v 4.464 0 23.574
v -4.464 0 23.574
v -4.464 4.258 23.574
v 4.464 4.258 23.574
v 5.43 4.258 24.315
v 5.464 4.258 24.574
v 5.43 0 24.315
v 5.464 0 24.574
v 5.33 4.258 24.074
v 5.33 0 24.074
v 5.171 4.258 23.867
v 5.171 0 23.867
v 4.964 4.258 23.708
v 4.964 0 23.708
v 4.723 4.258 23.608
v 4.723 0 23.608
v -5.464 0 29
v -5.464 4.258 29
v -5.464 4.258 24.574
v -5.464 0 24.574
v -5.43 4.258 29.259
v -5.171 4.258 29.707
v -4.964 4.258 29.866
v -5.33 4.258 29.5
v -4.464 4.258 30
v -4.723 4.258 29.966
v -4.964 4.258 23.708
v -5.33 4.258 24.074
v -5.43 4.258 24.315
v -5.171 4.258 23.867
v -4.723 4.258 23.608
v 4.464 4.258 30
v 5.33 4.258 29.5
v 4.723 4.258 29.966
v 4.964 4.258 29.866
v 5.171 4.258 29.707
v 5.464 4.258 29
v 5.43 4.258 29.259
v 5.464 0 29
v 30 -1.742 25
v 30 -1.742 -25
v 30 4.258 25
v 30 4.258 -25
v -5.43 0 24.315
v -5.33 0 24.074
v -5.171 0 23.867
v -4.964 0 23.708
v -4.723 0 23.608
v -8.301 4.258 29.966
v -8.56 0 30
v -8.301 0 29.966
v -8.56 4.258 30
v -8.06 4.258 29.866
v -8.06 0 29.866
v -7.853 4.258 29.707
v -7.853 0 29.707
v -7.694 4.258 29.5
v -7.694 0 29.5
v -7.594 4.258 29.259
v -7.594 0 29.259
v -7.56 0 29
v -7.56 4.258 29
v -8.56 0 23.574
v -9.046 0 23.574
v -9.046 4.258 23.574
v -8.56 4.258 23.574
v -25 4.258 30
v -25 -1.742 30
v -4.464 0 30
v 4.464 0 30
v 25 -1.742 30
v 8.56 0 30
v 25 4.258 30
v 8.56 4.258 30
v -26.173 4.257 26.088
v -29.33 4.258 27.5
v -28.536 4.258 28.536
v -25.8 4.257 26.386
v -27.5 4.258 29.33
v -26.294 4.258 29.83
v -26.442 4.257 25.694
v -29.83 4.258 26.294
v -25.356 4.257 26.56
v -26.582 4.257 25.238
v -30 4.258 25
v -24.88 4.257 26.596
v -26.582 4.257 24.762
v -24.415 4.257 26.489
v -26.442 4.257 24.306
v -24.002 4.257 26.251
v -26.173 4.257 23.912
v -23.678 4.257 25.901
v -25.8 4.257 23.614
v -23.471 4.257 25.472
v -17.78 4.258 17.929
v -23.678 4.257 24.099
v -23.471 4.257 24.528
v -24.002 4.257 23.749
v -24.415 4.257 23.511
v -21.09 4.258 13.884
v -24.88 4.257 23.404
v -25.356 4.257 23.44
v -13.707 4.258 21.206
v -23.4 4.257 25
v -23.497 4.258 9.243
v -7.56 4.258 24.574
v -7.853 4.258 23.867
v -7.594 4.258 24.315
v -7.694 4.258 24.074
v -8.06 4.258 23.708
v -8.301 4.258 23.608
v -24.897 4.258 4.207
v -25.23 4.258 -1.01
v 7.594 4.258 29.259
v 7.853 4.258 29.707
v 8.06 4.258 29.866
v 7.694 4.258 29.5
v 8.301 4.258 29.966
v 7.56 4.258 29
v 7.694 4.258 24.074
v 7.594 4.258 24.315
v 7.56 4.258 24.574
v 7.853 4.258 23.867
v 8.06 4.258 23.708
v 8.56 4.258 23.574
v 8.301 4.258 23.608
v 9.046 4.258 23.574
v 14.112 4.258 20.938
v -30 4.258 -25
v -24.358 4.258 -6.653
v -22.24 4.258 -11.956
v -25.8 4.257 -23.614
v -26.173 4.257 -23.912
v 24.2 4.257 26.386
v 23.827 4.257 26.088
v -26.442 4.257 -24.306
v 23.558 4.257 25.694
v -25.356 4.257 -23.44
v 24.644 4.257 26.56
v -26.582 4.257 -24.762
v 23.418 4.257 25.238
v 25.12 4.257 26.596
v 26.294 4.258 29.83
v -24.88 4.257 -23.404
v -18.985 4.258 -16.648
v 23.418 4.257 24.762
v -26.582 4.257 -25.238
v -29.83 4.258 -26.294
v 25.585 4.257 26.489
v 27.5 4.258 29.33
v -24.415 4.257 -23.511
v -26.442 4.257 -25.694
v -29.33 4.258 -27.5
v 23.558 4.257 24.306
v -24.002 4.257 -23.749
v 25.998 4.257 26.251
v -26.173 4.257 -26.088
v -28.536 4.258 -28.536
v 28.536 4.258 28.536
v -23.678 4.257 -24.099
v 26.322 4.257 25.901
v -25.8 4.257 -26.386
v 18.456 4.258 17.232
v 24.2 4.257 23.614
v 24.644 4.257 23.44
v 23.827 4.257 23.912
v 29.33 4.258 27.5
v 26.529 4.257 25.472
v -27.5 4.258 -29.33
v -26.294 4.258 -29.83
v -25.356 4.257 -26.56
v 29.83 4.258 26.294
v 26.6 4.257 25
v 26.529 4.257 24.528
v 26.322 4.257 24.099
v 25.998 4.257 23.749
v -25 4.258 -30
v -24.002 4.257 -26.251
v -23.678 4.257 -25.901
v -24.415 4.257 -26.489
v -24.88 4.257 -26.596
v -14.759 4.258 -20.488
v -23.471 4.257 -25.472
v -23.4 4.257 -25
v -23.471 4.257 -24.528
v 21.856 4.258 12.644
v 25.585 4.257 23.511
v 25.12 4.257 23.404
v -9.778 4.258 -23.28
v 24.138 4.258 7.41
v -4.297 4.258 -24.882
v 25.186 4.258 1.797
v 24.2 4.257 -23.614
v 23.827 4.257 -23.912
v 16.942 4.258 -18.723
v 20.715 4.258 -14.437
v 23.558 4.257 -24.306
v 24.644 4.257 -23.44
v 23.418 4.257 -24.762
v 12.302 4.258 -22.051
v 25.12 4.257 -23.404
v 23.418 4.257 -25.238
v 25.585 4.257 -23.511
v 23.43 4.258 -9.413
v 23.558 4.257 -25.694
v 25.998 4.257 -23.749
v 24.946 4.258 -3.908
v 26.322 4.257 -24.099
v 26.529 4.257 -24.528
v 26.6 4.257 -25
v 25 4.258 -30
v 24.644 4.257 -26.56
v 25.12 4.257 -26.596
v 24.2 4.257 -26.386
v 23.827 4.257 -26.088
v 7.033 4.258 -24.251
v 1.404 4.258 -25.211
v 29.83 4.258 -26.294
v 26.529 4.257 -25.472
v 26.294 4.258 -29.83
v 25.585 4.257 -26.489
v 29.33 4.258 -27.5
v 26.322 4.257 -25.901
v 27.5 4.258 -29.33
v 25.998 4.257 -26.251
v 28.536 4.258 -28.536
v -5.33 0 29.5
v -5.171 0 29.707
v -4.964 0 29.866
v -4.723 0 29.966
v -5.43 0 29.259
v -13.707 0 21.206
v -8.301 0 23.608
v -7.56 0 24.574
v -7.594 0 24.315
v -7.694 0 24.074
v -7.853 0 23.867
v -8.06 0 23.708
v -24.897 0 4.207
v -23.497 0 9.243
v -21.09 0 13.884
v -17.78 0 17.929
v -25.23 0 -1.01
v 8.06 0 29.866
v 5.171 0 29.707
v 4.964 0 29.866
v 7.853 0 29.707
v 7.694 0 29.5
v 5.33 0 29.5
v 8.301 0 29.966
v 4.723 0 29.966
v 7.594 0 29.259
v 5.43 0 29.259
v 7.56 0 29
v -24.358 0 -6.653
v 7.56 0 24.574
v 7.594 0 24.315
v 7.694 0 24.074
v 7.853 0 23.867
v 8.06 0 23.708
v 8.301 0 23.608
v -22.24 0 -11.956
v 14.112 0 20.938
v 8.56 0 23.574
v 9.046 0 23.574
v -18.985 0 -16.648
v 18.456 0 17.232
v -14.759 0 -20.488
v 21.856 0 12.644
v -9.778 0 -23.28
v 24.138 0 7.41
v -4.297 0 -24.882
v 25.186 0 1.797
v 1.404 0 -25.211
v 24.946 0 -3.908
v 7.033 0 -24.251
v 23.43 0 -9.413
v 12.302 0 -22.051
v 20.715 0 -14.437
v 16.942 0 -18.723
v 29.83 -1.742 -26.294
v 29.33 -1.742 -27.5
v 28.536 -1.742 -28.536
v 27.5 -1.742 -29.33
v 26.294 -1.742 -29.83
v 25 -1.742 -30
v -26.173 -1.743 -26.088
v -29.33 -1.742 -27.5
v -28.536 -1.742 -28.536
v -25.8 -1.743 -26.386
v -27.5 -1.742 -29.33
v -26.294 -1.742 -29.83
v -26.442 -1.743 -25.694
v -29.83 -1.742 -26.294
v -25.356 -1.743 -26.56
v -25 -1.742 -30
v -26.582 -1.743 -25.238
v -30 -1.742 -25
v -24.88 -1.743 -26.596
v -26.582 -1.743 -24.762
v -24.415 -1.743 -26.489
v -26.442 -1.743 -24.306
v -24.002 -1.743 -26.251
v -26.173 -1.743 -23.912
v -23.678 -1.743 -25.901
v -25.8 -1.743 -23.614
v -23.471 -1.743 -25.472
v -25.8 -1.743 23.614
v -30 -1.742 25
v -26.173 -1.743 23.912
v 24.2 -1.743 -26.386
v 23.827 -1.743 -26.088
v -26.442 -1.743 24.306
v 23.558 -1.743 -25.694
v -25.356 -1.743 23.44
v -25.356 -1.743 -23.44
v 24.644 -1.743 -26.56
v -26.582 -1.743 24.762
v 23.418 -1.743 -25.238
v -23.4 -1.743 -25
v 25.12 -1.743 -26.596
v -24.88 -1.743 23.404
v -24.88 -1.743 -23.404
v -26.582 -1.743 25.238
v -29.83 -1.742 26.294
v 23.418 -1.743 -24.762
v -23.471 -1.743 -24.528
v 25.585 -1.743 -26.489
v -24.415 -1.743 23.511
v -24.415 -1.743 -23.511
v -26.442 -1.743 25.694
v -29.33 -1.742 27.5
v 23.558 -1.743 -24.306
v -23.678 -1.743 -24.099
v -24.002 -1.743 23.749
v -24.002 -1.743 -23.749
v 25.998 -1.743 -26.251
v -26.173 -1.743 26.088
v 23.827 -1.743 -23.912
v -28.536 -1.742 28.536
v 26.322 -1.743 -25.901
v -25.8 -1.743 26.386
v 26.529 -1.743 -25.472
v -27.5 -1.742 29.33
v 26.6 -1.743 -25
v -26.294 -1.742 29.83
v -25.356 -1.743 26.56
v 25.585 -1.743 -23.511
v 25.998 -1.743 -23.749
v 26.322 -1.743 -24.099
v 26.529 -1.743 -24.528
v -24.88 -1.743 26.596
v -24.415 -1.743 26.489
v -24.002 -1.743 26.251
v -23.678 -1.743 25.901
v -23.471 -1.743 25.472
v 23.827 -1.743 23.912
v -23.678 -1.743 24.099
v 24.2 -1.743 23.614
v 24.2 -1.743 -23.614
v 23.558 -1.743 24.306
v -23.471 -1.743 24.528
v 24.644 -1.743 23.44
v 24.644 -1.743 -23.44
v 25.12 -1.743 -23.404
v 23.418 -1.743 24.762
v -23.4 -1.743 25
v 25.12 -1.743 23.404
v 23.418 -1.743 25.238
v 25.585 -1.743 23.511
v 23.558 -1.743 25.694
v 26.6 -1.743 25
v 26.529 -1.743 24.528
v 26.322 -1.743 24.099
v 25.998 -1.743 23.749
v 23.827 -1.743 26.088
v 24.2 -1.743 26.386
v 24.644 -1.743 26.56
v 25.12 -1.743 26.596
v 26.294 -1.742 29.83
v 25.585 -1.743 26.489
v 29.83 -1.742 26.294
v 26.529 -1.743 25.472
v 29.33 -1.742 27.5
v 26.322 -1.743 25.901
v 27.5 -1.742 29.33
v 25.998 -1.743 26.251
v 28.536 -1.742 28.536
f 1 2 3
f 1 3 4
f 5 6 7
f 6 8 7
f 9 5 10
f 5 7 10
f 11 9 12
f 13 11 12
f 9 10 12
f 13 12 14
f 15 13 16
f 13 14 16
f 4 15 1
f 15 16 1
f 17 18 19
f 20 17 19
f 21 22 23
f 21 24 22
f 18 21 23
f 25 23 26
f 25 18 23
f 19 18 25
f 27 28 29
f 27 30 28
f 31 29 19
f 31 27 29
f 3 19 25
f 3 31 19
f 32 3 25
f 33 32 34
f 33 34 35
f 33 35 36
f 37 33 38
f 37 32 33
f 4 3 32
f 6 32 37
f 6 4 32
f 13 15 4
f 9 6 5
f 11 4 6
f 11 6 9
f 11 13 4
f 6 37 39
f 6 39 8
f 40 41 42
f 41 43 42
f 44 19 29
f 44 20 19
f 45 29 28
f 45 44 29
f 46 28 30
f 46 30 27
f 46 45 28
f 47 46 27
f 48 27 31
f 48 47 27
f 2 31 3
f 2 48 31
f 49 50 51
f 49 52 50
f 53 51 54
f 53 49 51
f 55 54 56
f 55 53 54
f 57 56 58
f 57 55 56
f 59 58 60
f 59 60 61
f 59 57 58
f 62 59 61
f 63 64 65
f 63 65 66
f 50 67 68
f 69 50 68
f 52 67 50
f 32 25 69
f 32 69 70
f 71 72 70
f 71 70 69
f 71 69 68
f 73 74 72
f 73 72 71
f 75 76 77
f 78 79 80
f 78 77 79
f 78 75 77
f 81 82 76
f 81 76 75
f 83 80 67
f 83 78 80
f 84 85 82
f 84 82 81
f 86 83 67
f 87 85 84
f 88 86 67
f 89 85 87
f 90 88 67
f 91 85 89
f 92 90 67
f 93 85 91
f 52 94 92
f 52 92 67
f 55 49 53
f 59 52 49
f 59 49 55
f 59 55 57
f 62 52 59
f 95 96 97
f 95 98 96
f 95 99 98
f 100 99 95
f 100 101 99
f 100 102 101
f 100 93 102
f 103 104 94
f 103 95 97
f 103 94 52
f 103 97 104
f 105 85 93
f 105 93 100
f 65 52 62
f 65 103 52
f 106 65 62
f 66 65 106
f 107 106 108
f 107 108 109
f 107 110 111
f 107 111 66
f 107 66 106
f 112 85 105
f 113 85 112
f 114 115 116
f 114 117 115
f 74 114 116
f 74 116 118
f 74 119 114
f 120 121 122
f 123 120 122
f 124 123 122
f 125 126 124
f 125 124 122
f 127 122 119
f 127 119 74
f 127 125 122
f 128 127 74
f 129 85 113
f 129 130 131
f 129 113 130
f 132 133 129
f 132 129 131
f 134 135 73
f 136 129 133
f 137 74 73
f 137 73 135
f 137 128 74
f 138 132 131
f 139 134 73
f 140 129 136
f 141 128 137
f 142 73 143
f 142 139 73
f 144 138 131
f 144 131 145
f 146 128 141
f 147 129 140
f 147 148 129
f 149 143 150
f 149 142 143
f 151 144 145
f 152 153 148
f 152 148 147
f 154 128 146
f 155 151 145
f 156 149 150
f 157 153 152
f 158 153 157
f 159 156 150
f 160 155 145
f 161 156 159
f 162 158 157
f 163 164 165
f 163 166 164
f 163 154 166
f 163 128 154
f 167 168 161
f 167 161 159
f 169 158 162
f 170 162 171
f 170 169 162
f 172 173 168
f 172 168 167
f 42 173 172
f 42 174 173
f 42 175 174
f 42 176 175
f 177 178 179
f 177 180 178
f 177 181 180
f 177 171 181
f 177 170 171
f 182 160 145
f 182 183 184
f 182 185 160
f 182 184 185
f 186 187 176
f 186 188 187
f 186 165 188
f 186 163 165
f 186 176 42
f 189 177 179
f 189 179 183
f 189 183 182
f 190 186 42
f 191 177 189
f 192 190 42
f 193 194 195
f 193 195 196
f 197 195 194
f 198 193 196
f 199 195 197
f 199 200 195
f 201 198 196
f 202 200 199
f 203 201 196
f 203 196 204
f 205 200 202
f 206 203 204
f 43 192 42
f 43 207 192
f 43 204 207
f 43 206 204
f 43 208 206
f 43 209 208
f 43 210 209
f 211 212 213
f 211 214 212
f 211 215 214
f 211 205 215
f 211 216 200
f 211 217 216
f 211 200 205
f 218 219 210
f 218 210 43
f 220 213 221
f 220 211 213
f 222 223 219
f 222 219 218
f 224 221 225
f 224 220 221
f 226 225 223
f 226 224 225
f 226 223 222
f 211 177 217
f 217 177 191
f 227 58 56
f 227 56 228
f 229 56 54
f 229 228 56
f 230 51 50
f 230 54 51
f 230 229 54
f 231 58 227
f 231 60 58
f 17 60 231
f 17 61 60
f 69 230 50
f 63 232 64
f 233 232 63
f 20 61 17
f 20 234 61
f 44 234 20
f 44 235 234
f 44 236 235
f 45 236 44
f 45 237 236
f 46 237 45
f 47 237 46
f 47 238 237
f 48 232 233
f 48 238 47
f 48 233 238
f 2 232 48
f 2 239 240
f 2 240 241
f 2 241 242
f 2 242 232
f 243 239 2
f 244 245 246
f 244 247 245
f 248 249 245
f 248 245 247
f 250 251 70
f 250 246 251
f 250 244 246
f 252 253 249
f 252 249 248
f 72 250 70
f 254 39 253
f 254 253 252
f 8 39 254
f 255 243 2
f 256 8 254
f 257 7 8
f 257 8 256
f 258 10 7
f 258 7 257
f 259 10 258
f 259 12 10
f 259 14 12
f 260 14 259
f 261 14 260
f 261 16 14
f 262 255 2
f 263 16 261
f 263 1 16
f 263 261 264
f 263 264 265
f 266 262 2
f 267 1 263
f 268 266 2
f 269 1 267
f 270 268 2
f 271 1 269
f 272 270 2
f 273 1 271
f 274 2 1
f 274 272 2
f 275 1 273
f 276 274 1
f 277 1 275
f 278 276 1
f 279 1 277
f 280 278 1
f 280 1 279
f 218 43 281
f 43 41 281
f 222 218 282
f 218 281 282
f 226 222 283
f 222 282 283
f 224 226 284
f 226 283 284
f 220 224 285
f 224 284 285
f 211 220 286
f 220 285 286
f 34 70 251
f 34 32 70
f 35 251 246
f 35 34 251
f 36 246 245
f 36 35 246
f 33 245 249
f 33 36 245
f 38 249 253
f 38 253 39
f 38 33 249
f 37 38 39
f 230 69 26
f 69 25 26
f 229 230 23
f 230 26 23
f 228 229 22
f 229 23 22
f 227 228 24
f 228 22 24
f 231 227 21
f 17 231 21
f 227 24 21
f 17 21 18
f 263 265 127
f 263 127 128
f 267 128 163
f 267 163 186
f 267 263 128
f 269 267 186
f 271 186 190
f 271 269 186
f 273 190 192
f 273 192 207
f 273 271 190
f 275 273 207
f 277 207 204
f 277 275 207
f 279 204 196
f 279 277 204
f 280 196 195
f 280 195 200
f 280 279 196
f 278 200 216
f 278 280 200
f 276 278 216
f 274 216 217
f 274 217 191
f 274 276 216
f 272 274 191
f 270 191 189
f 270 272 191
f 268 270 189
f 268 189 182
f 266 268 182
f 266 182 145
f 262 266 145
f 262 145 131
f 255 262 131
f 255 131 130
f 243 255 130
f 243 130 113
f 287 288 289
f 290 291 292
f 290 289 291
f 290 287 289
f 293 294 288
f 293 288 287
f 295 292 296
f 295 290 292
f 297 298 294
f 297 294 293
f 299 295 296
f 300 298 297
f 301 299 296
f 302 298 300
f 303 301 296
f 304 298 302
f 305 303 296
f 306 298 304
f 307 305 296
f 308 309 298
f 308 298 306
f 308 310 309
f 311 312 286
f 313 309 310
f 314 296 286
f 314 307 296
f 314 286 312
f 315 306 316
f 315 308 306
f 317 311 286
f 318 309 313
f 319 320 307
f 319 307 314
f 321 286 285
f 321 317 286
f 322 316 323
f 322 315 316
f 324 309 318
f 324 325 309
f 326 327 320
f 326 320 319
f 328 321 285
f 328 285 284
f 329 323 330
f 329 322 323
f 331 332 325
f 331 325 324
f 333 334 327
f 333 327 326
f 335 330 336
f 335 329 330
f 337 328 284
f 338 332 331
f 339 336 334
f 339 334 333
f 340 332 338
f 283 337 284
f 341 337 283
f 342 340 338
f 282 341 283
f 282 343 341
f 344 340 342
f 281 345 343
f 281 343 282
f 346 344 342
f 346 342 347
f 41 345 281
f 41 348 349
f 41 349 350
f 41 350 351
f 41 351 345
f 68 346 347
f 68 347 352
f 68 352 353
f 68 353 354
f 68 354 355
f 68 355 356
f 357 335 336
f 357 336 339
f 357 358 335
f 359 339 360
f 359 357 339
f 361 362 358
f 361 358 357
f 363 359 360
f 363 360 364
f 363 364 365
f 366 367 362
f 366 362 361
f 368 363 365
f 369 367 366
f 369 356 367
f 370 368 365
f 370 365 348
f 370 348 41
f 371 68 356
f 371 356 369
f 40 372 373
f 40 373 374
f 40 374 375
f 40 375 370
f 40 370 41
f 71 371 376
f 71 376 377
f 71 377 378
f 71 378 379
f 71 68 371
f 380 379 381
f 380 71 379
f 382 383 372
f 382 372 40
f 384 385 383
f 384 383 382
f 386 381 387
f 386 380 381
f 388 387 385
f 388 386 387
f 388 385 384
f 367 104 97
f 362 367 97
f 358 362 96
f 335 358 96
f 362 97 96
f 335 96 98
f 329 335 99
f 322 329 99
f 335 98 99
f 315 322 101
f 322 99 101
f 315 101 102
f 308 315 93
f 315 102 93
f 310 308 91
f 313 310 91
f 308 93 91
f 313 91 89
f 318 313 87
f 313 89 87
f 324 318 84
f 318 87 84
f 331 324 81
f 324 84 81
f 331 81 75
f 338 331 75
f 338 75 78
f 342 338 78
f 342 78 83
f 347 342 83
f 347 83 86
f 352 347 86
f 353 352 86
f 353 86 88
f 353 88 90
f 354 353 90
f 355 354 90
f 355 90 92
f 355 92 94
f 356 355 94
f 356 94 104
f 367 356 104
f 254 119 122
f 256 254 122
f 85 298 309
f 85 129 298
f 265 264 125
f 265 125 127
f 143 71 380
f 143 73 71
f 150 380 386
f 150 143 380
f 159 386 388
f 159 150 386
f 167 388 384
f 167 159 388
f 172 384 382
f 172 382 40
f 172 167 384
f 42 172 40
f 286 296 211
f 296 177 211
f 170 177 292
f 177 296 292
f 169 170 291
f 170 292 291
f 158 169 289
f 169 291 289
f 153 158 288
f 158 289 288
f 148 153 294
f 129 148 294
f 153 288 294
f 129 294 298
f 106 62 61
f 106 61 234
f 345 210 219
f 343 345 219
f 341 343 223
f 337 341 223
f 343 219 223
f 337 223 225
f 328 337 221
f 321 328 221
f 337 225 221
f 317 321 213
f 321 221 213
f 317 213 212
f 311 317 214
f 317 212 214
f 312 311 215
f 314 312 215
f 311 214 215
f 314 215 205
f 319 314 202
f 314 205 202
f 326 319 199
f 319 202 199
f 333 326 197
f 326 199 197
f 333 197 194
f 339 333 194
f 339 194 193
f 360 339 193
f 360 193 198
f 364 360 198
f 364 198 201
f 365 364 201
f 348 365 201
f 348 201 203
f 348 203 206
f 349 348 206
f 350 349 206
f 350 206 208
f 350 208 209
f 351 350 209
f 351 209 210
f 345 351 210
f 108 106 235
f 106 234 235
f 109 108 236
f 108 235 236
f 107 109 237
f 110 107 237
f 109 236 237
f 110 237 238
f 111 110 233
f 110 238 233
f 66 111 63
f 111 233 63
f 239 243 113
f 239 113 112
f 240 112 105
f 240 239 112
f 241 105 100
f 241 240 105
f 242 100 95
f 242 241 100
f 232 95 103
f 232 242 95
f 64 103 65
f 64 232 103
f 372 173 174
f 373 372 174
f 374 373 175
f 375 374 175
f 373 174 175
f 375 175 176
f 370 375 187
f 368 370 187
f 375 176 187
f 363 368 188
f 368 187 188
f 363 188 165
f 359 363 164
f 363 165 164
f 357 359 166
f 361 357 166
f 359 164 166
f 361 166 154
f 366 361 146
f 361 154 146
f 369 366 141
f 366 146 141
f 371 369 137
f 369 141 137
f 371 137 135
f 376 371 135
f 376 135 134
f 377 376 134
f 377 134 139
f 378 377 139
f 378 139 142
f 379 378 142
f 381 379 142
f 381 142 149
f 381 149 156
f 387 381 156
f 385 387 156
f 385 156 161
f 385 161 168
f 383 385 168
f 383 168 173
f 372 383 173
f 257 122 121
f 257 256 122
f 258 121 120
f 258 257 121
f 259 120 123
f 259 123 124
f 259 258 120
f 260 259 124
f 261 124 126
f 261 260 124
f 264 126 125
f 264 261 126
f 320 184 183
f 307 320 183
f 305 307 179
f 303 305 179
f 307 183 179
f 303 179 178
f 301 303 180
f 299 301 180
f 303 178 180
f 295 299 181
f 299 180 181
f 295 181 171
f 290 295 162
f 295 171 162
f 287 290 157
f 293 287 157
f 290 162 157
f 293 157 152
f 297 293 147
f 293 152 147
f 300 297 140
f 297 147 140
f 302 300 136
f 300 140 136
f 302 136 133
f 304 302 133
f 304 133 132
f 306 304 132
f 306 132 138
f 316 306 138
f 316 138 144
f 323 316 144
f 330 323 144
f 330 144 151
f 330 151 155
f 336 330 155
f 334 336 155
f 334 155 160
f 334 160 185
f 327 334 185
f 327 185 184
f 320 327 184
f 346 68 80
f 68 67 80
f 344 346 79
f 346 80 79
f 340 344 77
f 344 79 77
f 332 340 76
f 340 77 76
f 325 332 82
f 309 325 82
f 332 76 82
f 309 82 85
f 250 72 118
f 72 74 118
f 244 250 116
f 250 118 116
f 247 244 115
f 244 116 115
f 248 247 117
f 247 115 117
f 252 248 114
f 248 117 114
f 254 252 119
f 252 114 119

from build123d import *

# Parameters (mm, degrees)
SKETCH1_W            = 60
SKETCH1_H            = 60
BOSS_EXTRUDE1_DEPTH  = 4.2575
SKETCH2_W            = 60
SKETCH2_H            = 60
BOSS_EXTRUDE2_DEPTH  = 1.7425
SKETCH3_W            = 2.095743483
SKETCH3_H            = 23.459092757
CUT_EXTRUDE1_DEPTH   = 4.2575
FILLET1_R            = 1
FILLET2_R            = 5
M3_CLEARANCE_HOLE1_D = 3.2


with BuildPart() as part:
    # Sketch1 → Boss-Extrude1 (new body)
    with BuildSketch(Plane(origin=(0, 0, 0), x_dir=(1, 0, 0), z_dir=(0, 1, 0))):
        Rectangle(SKETCH1_W, SKETCH1_H)
        with BuildLine():
            Line((-9.04644108, -23.573807579), (9.04644108, -23.573807579))
            ThreePointArc((9.04644108, -23.573807579), (14.716185301, 20.518196562), (-25.229791914, 1.01))
            ThreePointArc((-25.229791914, 1.01), (-21.090422846, -13.883679778), (-9.04644108, -23.573807579))
        make_face(mode=Mode.SUBTRACT)
    extrude(amount=BOSS_EXTRUDE1_DEPTH)

    # Sketch2 → Boss-Extrude2 (add)
    with BuildSketch(Plane.XZ):
        Rectangle(SKETCH2_W, SKETCH2_H)
    extrude(amount=BOSS_EXTRUDE2_DEPTH)

    # Sketch3 → Cut-Extrude1 (cut)
    with BuildSketch(Plane(origin=(0, 4.2575, 0), x_dir=(1, 0, 0), z_dir=(0, 1, 0))):
        with Locations((-6.512128259, -34.72527871)):
            Rectangle(SKETCH3_W, SKETCH3_H)
        with Locations((6.512128259, -34.72527871)):
            Rectangle(SKETCH3_W, SKETCH3_H)
    extrude(amount=-CUT_EXTRUDE1_DEPTH, mode=Mode.SUBTRACT)

    # Fillet1
    fillet1_edges = [part.edges().sort_by_distance(p)[0] for p in [
        (-5.464256517, 2.12875, 30),
        (-5.464256517, 2.12875, 23.573807579),
        (-7.56, 2.12875, 30),
        (-7.56, 2.12875, 23.573807579),
        (5.464256517, 2.12875, 30),
        (5.464256517, 2.12875, 23.573807579),
        (7.56, 2.12875, 30),
        (7.56, 2.12875, 23.573807579),
    ]]
    fillet(fillet1_edges, radius=FILLET1_R)

    # Fillet2
    fillet2_edges = [part.edges().sort_by_distance(p)[0] for p in [
        (30, 1.2575, 30),
        (-30, 1.2575, 30),
        (-30, 1.2575, -30),
        (30, 1.2575, -30),
    ]]
    fillet(fillet2_edges, radius=FILLET2_R)

    # M3 Clearance Hole1 (through all)
    with Locations(Plane(origin=(0, -1.7425, 0), x_dir=(-1, 0, 0), z_dir=(0, -1, 0))):
        with Locations((-25, 25), (25, 25), (25, -25), (-25, -25)):
            Hole(M3_CLEARANCE_HOLE1_D / 2)


solid = part.part
